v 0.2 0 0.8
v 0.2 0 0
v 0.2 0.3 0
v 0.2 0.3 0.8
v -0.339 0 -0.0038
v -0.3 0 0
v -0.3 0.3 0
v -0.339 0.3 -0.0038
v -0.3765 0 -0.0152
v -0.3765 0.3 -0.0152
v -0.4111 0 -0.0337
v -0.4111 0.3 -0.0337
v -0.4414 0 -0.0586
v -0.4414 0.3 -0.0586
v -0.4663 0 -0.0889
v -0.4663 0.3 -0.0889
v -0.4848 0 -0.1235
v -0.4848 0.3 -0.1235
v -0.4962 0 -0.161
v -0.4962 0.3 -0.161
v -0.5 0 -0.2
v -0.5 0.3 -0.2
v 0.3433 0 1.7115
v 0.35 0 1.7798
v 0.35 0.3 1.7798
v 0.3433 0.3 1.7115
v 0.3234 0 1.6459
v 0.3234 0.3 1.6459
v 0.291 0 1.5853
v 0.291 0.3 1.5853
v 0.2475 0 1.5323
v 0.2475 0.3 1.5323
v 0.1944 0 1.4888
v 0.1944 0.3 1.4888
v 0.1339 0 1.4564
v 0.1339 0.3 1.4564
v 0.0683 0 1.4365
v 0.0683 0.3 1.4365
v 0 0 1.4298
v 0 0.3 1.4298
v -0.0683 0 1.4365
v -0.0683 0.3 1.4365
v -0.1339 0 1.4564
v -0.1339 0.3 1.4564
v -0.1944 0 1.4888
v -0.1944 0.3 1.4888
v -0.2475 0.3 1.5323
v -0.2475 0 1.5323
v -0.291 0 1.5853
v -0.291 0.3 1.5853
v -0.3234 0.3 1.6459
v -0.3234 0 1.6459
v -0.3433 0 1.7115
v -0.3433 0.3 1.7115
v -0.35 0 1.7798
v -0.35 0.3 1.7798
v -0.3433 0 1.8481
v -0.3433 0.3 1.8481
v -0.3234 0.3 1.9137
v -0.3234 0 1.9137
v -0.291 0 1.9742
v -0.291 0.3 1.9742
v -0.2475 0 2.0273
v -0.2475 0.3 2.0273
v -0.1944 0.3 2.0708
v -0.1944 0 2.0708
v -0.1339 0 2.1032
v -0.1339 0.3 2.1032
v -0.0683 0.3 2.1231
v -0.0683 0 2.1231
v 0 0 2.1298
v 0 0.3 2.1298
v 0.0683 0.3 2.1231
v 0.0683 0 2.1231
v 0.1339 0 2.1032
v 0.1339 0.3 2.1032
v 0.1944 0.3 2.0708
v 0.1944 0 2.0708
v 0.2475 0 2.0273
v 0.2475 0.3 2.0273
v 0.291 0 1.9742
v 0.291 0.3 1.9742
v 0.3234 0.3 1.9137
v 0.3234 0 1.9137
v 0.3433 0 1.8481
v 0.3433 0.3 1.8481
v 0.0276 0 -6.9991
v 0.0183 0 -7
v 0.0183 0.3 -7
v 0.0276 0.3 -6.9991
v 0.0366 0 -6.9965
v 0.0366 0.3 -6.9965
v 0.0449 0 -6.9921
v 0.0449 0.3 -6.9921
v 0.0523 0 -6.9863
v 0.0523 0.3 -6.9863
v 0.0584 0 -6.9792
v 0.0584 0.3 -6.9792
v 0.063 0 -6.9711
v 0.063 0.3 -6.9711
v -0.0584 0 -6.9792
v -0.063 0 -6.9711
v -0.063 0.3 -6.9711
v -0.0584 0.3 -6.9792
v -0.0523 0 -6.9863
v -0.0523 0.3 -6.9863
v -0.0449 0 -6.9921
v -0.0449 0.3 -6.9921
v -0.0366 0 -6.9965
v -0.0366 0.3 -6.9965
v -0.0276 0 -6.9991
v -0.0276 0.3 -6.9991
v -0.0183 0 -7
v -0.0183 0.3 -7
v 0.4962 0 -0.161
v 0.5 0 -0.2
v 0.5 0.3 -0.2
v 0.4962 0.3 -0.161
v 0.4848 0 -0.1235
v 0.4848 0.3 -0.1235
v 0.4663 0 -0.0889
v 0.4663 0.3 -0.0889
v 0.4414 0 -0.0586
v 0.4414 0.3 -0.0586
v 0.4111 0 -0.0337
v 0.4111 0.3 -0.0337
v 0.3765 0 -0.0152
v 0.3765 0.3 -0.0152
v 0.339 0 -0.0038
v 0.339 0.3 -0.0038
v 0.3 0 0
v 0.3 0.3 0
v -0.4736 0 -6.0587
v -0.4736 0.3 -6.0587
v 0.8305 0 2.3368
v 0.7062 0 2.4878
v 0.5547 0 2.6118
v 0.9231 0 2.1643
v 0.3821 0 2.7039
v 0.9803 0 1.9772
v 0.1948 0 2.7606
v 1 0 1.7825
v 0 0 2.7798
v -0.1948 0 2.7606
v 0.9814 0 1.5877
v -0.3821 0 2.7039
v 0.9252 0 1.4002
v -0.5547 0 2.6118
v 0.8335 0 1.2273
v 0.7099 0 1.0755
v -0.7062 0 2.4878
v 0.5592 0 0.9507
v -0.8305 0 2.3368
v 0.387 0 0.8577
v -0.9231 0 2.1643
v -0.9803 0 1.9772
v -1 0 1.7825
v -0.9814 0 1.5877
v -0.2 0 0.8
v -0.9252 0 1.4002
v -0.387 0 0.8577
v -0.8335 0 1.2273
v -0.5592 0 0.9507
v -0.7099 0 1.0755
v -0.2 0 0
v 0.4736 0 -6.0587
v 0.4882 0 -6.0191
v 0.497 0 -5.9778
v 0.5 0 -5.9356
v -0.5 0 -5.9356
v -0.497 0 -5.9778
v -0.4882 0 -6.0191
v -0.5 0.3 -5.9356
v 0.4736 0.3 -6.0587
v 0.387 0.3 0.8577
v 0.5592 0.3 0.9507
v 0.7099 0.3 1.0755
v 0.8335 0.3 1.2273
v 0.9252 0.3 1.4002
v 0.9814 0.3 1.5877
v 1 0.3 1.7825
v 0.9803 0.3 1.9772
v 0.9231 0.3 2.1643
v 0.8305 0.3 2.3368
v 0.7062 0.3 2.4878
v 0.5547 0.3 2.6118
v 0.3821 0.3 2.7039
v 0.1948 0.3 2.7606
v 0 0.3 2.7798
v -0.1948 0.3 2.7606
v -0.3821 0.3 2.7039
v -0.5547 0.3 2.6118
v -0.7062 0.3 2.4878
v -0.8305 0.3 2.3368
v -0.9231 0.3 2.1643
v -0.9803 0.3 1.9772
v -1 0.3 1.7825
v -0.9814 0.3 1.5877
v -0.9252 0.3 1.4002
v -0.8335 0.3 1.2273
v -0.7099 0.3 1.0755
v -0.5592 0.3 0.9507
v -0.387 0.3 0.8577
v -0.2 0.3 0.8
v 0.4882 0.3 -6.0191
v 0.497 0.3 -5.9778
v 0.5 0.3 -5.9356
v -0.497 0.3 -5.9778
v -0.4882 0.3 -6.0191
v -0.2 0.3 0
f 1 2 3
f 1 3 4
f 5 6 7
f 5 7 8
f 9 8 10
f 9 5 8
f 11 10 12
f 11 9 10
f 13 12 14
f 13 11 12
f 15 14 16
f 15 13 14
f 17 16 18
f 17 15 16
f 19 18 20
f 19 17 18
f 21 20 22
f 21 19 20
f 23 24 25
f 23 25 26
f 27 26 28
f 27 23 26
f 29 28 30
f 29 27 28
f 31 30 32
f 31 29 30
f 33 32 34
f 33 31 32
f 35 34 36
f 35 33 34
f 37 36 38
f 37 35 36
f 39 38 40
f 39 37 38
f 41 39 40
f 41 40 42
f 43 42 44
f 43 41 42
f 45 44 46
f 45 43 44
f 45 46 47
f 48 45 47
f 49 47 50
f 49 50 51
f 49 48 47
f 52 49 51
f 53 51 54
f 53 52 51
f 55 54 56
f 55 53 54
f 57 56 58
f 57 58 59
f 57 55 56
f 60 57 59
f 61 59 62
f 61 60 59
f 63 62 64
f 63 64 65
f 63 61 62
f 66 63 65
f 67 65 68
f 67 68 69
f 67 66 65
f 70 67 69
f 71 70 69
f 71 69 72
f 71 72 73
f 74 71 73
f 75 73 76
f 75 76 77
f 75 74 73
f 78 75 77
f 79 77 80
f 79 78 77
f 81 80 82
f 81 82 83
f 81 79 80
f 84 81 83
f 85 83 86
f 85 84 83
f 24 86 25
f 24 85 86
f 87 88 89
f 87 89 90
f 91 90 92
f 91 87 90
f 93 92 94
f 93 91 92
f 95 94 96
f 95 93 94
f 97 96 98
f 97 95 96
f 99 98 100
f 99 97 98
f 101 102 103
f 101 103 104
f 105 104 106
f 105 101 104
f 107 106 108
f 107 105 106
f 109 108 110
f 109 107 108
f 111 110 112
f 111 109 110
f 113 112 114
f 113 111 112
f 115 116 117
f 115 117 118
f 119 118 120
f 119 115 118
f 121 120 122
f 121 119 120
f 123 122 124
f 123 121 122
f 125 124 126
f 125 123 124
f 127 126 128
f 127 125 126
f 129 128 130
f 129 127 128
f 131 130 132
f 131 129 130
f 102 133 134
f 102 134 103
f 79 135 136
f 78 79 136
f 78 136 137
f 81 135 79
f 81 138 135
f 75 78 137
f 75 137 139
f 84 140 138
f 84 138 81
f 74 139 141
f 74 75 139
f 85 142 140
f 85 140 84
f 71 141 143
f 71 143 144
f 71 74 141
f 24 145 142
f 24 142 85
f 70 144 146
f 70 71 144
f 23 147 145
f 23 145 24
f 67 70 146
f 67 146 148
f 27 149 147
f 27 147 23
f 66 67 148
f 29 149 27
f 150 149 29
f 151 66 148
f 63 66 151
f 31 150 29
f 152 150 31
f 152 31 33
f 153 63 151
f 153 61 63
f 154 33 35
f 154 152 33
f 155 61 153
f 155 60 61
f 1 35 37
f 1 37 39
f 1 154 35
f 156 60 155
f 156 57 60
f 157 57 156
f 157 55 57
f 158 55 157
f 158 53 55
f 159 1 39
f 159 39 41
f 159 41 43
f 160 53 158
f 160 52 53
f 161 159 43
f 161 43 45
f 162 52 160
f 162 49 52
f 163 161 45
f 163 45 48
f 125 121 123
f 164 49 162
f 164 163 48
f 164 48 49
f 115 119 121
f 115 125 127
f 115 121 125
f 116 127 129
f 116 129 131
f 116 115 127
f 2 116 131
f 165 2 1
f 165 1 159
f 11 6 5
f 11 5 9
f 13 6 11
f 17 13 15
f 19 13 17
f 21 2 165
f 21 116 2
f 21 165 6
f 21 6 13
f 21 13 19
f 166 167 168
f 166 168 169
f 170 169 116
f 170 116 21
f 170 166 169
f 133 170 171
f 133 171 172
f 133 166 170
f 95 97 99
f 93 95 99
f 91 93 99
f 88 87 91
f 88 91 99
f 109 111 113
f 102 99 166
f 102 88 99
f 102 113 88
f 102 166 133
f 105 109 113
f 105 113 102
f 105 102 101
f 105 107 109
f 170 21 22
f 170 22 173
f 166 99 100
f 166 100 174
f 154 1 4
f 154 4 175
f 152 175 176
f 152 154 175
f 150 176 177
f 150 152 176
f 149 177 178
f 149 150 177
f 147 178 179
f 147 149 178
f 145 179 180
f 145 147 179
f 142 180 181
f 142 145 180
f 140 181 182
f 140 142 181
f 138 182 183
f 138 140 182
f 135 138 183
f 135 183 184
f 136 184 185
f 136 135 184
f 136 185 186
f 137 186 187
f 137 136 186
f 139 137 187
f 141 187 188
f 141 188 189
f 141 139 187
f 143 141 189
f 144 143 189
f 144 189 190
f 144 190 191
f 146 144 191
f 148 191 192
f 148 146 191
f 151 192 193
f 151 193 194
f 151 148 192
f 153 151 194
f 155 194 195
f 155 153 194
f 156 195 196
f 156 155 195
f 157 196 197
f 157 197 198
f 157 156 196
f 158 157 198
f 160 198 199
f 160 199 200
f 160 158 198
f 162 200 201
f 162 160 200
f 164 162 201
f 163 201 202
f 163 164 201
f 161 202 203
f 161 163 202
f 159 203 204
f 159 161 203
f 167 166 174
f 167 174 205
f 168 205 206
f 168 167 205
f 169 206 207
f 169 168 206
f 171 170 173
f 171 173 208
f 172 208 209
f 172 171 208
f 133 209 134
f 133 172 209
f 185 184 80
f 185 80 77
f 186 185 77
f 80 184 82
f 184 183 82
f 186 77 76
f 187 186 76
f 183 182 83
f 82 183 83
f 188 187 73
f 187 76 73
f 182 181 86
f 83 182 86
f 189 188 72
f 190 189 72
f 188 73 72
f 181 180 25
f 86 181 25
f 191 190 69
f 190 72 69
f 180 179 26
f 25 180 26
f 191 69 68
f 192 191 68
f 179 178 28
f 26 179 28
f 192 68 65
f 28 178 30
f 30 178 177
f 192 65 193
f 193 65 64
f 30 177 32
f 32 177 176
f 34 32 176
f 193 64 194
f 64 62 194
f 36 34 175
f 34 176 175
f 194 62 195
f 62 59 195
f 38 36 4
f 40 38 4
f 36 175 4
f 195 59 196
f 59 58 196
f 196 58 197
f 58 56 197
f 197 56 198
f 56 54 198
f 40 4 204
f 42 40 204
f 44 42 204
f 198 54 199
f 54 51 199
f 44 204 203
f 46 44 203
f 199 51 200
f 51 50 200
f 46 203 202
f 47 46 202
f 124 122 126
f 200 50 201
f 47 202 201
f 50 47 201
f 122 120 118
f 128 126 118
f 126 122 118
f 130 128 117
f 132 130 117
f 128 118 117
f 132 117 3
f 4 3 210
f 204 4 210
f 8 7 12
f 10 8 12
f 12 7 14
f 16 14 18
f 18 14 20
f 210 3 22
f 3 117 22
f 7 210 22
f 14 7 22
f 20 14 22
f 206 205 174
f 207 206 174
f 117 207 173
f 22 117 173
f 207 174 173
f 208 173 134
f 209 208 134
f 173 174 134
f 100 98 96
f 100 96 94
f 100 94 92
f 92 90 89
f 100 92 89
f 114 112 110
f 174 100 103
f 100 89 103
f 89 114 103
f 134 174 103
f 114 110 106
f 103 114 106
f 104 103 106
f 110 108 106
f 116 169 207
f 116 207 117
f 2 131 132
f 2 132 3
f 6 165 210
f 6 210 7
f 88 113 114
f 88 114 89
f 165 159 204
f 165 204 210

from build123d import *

# Parameters (mm, degrees)
SKETCH1_R           = 0.35
BOSS_EXTRUDE1_DEPTH = 0.3


with BuildPart() as part:
    # Sketch1 → Boss-Extrude1 (new body)
    with BuildSketch(Plane(origin=(0, 0, 0), x_dir=(1, 0, 0), z_dir=(0, 1, 0))):
        with BuildLine():
            Line((0.063001459, 6.971107869), (0.473576452, 6.058718997))
            ThreePointArc((0.473576452, 6.058718997), (0.493319736, 5.998566184), (0.5, 5.935609593))
            Line((0.5, 5.935609593), (0.5, 0.2))
            ThreePointArc((0.5, 0.2), (0.441421356, 0.058578644), (0.3, 0))
            Line((0.3, 0), (0.2, 0))
            Line((0.2, 0), (0.2, -0.8))
            ThreePointArc((0.2, -0.8), (0, -2.779795897), (-0.2, -0.8))
            Line((-0.2, -0.8), (-0.2, 0))
            Line((-0.2, 0), (-0.3, 0))
            ThreePointArc((-0.3, 0), (-0.441421356, 0.058578644), (-0.5, 0.2))
            Line((-0.5, 0.2), (-0.5, 5.935609593))
            ThreePointArc((-0.5, 5.935609593), (-0.493319736, 5.998566184), (-0.473576452, 6.058718997))
            Line((-0.473576452, 6.058718997), (-0.063001459, 6.971107869))
            ThreePointArc((-0.063001459, 6.971107869), (-0.044922891, 6.992147816), (-0.018317305, 7))
            Line((-0.018317305, 7), (0.018317305, 7))
            ThreePointArc((0.018317305, 7), (0.044922891, 6.992147816), (0.063001459, 6.971107869))
        make_face()
        with Locations((0, -1.779795897)):
            Circle(SKETCH1_R, mode=Mode.SUBTRACT)
    extrude(amount=BOSS_EXTRUDE1_DEPTH)


solid = part.part
